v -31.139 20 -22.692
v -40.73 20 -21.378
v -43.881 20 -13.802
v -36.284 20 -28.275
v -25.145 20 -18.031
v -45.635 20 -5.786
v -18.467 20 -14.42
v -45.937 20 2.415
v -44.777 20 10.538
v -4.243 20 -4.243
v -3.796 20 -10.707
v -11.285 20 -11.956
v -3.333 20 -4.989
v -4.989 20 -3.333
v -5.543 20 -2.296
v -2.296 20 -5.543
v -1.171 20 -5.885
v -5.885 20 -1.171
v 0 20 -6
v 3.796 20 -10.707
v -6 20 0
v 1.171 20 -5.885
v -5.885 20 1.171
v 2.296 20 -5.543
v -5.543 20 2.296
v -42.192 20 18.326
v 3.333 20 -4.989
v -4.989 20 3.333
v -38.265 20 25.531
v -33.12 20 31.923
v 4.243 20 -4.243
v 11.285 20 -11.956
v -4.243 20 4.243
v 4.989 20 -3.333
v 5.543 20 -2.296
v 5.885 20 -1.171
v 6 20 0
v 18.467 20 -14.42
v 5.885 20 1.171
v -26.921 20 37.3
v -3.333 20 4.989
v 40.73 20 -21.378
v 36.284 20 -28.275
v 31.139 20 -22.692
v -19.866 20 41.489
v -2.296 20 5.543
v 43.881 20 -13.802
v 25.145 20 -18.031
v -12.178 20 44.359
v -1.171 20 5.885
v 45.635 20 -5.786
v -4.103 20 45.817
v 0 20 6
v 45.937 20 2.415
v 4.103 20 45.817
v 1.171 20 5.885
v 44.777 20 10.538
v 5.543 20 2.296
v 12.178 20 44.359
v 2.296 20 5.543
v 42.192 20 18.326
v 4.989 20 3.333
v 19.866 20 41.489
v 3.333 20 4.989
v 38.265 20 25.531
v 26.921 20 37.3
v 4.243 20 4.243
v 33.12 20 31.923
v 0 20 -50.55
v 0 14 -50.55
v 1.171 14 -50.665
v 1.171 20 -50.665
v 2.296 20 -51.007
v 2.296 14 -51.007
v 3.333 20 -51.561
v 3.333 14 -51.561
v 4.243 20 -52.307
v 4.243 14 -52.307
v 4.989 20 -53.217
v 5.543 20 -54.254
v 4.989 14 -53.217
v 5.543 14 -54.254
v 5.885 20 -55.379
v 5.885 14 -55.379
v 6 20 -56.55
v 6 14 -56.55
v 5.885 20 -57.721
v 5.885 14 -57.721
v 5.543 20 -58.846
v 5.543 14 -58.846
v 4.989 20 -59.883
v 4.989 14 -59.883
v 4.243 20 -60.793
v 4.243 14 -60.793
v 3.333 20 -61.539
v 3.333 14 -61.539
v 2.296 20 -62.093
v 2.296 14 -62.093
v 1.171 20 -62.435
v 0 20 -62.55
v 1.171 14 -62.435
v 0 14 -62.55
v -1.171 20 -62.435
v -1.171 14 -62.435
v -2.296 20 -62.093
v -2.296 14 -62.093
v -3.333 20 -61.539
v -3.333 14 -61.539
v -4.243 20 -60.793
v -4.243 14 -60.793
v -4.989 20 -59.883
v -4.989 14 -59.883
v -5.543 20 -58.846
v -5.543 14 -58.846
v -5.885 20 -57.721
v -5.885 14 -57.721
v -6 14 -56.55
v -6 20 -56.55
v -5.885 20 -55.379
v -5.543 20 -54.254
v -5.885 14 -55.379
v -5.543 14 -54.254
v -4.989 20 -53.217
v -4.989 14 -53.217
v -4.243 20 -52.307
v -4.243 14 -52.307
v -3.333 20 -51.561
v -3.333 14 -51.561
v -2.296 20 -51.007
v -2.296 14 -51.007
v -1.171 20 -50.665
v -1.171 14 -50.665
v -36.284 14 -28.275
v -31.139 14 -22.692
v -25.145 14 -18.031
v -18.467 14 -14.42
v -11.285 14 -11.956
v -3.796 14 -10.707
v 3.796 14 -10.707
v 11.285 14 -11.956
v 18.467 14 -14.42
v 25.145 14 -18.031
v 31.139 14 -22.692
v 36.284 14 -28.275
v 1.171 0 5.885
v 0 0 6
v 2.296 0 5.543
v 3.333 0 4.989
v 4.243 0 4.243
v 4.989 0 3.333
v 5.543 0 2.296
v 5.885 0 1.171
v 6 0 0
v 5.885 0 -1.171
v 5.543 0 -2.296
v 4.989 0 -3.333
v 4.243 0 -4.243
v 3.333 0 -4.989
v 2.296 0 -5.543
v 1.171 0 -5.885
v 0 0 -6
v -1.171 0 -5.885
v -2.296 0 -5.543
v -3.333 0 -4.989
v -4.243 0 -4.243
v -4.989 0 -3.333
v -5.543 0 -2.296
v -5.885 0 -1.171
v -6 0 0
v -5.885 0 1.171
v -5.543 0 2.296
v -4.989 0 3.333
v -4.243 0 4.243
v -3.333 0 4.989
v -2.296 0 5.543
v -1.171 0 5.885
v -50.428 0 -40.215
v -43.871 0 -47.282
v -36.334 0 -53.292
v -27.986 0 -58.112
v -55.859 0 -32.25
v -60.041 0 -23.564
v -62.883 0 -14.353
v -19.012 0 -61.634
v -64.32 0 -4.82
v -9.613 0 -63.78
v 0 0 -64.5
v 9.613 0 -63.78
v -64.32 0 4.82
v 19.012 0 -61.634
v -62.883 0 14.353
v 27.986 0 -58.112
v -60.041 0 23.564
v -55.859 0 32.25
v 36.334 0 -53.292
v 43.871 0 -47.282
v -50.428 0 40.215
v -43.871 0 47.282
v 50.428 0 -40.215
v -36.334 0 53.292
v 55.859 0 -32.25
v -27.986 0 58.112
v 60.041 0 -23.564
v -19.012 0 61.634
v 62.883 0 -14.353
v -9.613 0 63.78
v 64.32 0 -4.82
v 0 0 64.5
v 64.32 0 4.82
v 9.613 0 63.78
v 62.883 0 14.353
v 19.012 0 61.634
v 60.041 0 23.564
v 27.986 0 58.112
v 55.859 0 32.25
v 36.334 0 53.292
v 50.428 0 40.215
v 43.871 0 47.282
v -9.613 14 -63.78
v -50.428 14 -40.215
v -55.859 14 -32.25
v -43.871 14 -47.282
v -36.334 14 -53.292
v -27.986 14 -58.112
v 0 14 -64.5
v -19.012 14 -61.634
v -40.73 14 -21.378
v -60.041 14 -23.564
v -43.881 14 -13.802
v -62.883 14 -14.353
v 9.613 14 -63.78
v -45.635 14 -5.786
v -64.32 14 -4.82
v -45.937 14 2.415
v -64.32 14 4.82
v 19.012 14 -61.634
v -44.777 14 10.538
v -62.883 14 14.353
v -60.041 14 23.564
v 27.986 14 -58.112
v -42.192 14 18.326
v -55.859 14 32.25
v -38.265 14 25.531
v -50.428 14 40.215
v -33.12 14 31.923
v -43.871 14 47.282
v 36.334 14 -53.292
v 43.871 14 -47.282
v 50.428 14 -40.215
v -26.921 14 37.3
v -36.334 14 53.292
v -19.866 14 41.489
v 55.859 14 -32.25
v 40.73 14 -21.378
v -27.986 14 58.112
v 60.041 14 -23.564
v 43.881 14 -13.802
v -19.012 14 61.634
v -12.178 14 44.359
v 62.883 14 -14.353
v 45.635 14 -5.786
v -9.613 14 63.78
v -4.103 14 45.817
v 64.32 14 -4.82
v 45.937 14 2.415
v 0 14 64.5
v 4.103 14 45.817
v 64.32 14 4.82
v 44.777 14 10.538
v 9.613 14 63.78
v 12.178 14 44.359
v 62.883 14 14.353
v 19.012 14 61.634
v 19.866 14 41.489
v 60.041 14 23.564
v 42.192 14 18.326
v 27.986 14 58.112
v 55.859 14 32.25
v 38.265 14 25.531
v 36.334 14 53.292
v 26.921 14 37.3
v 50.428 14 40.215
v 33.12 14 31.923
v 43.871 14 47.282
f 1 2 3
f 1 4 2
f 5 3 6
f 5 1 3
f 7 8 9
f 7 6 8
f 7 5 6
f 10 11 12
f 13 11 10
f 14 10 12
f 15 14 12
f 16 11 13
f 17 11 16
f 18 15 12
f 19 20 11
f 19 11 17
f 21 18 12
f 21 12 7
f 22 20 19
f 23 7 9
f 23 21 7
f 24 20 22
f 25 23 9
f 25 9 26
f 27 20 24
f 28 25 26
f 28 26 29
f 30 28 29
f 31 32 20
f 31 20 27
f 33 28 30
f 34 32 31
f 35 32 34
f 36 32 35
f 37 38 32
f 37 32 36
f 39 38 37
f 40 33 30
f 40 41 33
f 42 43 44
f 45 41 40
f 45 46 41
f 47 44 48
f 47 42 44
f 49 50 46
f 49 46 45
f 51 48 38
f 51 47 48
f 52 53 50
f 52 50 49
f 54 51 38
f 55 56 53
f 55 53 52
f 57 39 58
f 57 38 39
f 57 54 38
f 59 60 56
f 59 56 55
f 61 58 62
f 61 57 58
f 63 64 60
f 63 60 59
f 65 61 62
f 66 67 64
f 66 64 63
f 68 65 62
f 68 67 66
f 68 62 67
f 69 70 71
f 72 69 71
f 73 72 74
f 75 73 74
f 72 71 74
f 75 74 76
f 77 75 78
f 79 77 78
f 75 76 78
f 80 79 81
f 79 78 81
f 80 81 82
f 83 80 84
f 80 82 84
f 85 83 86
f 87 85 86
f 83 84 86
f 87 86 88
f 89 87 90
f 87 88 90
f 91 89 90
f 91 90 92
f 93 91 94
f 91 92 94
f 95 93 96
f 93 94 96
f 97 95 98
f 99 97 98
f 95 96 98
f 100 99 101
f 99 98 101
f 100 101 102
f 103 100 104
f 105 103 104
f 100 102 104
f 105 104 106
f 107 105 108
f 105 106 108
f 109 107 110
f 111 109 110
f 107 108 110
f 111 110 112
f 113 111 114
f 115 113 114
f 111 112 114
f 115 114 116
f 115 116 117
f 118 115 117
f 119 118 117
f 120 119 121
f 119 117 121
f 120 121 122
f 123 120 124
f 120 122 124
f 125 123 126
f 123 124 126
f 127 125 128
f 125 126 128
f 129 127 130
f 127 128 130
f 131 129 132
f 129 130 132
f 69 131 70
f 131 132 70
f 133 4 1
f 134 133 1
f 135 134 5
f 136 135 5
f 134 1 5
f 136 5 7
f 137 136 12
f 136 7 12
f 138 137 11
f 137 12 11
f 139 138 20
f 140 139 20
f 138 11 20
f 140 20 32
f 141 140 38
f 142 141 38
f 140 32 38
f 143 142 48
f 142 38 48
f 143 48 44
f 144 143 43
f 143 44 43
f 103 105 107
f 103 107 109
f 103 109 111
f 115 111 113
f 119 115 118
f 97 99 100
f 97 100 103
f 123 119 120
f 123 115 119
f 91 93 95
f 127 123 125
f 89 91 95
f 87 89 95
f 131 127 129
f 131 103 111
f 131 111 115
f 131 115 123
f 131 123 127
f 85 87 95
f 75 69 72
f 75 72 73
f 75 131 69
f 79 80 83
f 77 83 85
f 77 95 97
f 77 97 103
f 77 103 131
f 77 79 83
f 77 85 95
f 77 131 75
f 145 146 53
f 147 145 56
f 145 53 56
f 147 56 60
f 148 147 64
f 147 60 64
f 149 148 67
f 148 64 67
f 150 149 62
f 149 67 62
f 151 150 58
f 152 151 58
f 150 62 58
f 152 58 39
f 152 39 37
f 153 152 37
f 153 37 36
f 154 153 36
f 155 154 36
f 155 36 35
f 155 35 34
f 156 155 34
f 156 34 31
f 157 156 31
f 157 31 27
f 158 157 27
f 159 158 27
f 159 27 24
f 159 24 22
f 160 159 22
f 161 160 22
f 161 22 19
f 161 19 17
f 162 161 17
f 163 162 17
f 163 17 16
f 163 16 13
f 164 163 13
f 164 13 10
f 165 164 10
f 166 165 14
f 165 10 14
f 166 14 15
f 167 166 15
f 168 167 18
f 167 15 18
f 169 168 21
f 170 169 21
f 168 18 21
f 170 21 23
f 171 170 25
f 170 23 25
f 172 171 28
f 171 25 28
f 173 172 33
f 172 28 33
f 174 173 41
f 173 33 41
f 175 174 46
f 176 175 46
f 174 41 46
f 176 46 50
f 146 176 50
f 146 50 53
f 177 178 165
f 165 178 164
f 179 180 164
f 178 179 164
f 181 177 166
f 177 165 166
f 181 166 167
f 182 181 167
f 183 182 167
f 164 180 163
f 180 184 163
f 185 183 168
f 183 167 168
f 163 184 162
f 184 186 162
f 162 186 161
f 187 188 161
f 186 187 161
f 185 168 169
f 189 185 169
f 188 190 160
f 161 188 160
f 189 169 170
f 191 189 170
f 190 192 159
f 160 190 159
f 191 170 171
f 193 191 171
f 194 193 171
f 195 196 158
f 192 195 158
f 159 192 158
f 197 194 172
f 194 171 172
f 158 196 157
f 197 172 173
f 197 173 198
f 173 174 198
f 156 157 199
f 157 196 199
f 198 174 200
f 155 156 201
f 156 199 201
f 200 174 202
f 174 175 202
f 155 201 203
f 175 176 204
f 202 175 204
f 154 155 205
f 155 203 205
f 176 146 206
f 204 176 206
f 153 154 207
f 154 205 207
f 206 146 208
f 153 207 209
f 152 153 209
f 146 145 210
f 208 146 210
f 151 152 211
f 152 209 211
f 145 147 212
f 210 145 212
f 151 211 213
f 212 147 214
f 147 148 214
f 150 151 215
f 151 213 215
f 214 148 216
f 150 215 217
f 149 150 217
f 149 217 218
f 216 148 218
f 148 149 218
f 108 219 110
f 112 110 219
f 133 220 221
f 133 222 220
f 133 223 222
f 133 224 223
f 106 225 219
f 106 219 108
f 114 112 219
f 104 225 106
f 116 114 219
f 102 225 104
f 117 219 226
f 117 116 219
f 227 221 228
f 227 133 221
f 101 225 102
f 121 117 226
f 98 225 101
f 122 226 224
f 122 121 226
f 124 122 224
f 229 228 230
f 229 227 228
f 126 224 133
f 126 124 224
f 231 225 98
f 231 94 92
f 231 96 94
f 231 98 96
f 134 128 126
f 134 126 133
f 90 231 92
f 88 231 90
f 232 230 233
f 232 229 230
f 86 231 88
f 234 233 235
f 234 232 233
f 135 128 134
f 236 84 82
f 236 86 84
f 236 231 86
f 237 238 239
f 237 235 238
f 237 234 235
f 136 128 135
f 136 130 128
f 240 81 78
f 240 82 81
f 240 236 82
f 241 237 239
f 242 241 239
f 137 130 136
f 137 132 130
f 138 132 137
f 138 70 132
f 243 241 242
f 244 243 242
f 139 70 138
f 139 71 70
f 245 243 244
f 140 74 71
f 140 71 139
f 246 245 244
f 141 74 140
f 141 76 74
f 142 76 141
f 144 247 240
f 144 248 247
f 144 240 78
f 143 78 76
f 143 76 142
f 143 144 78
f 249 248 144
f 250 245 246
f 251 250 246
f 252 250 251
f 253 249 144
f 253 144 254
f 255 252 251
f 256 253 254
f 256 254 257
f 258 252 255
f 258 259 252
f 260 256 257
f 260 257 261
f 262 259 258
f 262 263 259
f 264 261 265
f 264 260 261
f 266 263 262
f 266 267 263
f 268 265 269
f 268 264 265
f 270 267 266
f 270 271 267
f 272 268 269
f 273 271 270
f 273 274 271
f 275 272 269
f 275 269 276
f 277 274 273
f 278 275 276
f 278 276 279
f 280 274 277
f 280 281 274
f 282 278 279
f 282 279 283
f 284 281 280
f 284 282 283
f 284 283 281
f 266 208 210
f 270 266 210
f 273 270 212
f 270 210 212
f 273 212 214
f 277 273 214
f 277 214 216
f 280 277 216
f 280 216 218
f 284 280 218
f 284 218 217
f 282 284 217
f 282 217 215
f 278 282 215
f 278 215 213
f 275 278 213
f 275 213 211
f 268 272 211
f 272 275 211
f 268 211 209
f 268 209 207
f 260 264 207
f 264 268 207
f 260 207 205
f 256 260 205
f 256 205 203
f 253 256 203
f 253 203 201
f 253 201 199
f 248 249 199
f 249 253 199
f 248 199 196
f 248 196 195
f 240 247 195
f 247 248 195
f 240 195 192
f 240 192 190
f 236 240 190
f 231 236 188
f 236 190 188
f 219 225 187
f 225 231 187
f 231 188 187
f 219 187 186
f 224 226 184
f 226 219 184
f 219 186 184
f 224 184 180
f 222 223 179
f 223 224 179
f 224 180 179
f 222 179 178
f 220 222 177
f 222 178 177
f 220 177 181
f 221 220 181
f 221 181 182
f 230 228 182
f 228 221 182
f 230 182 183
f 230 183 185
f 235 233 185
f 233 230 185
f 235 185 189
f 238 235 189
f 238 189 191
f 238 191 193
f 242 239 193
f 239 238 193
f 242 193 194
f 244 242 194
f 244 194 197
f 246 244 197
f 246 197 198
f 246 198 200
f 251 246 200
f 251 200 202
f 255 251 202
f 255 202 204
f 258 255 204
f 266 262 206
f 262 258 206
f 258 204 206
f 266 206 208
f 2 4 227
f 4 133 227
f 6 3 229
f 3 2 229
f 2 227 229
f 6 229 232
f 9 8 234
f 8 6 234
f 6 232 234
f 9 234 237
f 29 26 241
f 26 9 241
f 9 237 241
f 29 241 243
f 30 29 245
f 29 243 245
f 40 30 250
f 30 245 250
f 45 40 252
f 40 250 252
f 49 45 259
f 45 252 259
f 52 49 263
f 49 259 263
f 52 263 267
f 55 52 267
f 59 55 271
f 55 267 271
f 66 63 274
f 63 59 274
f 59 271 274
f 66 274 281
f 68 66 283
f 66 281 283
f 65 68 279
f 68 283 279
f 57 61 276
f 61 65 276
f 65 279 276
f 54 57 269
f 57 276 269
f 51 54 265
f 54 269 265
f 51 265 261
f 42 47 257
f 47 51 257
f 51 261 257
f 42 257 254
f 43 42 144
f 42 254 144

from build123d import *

# Parameters (mm, degrees)
SKETCH1_R           = 64.5
BOSS_EXTRUDE1_DEPTH = 14
SKETCH2_R           = 46
BOSS_EXTRUDE2_DEPTH = 6
SKETCH3_R           = 46
CUT_EXTRUDE3_DEPTH  = 6
SKETCH4_R           = 6
BOSS_EXTRUDE3_DEPTH = 6
SKETCH6_R           = 6
CUT_EXTRUDE2_DEPTH  = 94.383617407


with BuildPart() as part:
    # Sketch1 → Boss-Extrude1 (new body)
    with BuildSketch(Plane(origin=(0, 0, 0), x_dir=(1, 0, 0), z_dir=(0, 1, 0))):
        with Locations(Location((0, 0, 0), (0, 0, 270))):
            Circle(SKETCH1_R)
    extrude(amount=BOSS_EXTRUDE1_DEPTH)

    # Sketch2 → Boss-Extrude2 (add)
    with BuildSketch(Plane(origin=(0, 14, 0), x_dir=(1, 0, 0), z_dir=(0, 1, 0))):
        with Locations(Location((0, 0, 0), (0, 0, 270))):
            Circle(SKETCH2_R)
    extrude(amount=BOSS_EXTRUDE2_DEPTH)

    # Sketch3 → Cut-Extrude3 (cut)
    with BuildSketch(Plane(origin=(0, 20, 0), x_dir=(1, 0, 0), z_dir=(0, 1, 0))):
        with Locations((0, 56.55)):
            Circle(SKETCH3_R)
    extrude(amount=-CUT_EXTRUDE3_DEPTH, mode=Mode.SUBTRACT)

    # Sketch4 → Boss-Extrude3 (add)
    with BuildSketch(Plane(origin=(0, 14, 0), x_dir=(1, 0, 0), z_dir=(0, 1, 0))):
        with Locations(Location((0, 56.55, 0), (0, 0, 270))):
            Circle(SKETCH4_R)
    extrude(amount=BOSS_EXTRUDE3_DEPTH)

    # Sketch6 → Cut-Extrude2 (cut, through all)
    with BuildSketch(Plane(origin=(0, 20, 0), x_dir=(1, 0, 0), z_dir=(0, 1, 0))):
        with Locations(Location((0, 0, 0), (0, 0, 270))):
            Circle(SKETCH6_R)
    extrude(amount=-CUT_EXTRUDE2_DEPTH, mode=Mode.SUBTRACT)


solid = part.part
